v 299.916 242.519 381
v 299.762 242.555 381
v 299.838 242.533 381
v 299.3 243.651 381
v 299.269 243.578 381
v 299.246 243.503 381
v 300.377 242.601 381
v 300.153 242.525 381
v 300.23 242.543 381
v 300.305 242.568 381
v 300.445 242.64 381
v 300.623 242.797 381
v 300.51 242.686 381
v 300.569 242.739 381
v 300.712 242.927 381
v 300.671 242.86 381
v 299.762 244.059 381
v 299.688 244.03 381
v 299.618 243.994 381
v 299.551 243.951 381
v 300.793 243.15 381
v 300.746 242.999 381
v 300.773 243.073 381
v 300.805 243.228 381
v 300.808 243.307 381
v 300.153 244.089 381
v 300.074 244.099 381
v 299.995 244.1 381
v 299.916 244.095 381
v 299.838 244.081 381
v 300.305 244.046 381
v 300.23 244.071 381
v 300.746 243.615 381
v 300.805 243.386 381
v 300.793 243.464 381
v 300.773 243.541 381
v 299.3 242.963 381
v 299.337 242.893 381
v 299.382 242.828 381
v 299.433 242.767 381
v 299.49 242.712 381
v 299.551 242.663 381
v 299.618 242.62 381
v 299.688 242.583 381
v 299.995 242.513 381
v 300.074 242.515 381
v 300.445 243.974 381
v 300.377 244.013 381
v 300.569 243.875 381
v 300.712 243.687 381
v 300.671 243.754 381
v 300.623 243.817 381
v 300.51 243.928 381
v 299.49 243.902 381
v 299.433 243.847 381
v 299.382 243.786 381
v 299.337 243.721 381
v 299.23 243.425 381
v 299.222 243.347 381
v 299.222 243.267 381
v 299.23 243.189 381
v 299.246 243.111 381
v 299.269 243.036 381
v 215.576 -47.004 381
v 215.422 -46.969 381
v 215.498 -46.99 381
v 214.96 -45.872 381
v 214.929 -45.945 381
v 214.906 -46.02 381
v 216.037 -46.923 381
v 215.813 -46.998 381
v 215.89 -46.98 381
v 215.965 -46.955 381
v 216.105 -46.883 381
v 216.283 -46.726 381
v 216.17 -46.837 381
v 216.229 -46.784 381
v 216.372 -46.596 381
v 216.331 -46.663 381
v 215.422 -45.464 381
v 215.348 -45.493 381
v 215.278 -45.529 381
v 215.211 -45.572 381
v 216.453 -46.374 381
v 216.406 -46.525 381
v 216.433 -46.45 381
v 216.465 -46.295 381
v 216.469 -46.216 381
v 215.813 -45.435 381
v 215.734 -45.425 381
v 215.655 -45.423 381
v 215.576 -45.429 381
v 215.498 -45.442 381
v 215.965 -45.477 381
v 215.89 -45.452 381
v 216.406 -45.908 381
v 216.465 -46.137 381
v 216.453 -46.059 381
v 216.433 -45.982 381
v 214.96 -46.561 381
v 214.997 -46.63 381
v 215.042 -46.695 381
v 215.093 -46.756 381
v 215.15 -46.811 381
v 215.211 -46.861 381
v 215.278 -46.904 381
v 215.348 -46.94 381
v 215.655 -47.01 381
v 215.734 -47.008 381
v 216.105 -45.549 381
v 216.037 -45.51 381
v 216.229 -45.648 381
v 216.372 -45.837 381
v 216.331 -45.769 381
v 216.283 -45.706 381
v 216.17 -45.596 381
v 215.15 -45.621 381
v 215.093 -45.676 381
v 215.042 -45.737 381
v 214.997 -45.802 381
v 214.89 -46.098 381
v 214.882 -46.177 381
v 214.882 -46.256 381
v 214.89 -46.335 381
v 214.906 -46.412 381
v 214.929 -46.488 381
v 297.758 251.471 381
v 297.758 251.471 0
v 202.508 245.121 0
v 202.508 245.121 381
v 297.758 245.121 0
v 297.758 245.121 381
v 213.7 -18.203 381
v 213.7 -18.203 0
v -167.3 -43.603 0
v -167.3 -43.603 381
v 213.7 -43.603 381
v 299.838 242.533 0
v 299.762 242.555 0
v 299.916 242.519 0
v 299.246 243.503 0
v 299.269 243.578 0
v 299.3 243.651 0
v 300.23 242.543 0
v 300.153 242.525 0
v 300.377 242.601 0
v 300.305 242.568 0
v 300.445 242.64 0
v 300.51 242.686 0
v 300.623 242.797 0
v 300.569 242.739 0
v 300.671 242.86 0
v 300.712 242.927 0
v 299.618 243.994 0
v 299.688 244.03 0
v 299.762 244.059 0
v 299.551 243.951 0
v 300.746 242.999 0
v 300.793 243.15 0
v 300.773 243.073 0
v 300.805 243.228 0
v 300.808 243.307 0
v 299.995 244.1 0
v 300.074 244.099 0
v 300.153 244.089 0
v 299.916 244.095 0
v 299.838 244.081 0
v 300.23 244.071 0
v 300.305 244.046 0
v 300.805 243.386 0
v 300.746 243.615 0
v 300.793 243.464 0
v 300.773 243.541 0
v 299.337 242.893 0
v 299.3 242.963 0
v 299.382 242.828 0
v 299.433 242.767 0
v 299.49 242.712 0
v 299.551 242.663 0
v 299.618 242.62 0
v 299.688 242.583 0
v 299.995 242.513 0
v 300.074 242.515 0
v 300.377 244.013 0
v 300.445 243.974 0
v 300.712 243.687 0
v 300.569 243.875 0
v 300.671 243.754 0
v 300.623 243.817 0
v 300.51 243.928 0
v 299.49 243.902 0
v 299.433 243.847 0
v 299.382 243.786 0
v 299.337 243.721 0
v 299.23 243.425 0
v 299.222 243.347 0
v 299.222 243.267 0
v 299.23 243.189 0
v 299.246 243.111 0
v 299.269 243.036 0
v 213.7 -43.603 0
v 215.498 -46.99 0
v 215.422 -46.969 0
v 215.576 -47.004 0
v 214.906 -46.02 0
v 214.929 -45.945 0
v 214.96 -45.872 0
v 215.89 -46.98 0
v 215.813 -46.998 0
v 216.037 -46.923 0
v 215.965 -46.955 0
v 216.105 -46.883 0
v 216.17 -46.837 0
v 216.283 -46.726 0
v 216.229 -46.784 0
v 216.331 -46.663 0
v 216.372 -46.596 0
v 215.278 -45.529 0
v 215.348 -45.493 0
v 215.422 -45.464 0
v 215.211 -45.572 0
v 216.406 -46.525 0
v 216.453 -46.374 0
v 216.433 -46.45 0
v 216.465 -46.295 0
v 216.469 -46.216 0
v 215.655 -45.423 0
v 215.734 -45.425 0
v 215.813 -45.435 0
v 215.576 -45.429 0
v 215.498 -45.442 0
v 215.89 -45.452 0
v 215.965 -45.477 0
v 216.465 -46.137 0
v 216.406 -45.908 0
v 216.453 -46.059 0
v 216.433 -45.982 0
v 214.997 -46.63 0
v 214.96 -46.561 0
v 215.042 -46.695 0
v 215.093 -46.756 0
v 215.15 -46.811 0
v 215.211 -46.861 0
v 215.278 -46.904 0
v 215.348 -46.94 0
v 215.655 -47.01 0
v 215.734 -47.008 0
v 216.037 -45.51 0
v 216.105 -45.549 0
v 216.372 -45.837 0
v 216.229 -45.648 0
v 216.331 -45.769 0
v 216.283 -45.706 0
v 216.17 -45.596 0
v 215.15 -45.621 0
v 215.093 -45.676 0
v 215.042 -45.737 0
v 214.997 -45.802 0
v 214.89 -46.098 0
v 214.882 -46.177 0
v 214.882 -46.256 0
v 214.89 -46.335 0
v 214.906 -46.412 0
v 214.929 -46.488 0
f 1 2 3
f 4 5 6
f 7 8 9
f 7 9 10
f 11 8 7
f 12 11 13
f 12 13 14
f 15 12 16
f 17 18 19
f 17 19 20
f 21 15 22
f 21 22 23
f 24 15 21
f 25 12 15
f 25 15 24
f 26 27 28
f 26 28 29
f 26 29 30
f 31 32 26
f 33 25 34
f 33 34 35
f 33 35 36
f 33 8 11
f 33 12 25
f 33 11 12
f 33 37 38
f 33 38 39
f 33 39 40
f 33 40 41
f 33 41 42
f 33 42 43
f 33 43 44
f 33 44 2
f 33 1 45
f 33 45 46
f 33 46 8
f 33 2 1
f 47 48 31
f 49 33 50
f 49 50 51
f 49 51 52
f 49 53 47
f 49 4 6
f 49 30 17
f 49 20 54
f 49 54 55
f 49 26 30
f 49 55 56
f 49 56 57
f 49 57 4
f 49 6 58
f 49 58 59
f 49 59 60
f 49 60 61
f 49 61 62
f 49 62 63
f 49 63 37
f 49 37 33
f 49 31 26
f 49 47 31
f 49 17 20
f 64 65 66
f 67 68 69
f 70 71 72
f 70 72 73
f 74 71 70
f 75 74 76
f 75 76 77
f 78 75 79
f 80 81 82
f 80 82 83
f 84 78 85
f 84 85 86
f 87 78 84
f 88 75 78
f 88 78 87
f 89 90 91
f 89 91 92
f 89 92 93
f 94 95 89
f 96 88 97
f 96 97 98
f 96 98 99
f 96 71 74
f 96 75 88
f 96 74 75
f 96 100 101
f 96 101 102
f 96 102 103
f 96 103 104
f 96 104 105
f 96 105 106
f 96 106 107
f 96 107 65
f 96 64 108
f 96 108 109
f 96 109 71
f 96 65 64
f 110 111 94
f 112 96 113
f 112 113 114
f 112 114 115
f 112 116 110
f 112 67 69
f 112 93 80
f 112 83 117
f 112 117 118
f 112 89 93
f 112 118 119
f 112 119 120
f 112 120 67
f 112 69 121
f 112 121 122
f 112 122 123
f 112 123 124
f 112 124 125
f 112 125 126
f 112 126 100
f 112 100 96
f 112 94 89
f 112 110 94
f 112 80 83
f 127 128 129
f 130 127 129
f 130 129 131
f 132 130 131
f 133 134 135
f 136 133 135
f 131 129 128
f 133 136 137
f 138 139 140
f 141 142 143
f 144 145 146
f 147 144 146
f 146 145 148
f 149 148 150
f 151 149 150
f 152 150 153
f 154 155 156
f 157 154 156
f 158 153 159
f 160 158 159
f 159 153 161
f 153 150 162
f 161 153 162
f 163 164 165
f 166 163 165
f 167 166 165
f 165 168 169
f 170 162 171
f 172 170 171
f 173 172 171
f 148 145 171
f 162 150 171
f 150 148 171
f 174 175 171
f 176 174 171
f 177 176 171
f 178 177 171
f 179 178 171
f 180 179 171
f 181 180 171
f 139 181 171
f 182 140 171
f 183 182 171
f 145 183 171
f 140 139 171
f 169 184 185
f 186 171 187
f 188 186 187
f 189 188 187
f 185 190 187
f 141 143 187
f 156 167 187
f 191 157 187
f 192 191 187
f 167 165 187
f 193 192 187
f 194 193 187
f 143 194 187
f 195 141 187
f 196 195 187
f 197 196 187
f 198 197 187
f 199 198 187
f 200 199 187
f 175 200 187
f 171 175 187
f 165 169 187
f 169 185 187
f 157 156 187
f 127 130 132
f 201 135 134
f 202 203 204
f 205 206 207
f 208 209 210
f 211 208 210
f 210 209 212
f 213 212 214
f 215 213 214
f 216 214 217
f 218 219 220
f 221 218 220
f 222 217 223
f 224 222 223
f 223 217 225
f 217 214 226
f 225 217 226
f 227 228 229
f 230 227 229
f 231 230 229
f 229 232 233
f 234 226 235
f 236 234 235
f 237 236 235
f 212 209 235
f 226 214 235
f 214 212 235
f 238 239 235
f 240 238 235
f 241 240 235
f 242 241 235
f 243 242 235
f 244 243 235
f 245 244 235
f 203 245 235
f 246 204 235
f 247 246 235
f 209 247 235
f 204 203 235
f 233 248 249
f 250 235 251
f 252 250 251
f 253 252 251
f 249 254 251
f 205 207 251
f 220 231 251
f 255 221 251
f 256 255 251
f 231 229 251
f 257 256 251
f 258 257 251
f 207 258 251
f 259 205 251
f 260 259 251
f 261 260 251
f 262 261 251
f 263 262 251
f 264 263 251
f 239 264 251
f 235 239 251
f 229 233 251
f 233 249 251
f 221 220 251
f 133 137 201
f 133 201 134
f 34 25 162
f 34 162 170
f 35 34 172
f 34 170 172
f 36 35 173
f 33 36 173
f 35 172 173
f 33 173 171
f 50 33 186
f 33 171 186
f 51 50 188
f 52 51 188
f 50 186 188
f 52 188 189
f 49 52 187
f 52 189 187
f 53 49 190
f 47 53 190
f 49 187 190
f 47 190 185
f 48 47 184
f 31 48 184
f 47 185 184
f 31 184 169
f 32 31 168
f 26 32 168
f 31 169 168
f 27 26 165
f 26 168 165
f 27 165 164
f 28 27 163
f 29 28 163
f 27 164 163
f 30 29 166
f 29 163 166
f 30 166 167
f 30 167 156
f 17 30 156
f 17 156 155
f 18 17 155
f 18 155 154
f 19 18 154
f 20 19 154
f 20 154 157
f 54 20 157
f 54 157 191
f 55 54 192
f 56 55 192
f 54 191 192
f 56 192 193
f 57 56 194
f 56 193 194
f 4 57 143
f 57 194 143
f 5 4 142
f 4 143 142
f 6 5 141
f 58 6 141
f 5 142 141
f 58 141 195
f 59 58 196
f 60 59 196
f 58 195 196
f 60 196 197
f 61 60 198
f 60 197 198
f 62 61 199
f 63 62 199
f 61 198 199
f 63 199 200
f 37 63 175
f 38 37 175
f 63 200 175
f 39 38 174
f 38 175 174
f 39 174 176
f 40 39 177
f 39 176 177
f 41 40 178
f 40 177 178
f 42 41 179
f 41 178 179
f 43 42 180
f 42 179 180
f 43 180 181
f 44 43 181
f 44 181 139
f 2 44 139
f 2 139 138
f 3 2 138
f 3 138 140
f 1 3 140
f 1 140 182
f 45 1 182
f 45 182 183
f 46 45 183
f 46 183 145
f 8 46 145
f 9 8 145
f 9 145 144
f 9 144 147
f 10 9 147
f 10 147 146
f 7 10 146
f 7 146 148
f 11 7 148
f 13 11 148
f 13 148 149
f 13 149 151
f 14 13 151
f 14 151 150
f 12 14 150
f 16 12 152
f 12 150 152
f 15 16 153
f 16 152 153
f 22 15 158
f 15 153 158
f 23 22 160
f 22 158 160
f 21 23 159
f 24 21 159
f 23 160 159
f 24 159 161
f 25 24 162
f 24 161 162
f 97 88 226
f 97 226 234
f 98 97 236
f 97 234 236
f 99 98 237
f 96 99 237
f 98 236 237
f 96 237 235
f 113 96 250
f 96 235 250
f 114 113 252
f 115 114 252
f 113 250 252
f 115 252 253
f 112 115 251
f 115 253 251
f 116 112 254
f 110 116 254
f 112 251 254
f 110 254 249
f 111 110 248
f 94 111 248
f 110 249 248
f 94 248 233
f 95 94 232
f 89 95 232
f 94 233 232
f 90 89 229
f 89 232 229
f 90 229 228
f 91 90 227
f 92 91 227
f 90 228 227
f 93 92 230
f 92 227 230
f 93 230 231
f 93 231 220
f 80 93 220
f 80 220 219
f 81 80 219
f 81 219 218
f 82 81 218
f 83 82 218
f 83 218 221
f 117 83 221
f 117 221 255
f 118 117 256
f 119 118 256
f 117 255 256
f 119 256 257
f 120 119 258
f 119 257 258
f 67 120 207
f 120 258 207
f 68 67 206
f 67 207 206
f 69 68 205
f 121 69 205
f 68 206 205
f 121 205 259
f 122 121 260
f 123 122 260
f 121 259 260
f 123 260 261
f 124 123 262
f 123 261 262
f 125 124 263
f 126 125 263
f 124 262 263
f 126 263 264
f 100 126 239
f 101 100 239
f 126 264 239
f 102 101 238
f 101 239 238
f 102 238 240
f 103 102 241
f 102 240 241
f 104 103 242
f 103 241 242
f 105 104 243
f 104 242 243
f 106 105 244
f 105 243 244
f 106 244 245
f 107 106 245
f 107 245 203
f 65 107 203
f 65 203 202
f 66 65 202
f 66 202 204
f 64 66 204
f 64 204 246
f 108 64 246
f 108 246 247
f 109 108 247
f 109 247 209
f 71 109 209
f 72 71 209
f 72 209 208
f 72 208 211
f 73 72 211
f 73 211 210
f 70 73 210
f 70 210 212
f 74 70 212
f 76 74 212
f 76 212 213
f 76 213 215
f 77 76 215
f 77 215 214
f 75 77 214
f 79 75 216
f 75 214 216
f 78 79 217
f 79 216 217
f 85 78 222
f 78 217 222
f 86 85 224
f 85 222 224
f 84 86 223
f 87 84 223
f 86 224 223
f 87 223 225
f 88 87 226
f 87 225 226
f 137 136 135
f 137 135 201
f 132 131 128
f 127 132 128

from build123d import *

# Parameters (mm, degrees)
F0_R     = 0.79375
F1_DEPTH = 381


with BuildPart() as f1:
    # F0 (on Top) → F1 (new body)
    with BuildSketch(Plane.XY):
        Polygon((213.69999, -18.203419), (-167.30001, -43.603419), (213.69999, -43.603419), align=None)
        Polygon((297.758271, 251.471002), (202.508271, 245.121002), (297.758271, 245.121002), align=None)
        with Locations((215.674788, -46.216223)):
            Circle(F0_R)
        with Locations((300.014734, 243.30698)):
            Circle(F0_R)
    extrude(amount=F1_DEPTH)


solid = f1.part
